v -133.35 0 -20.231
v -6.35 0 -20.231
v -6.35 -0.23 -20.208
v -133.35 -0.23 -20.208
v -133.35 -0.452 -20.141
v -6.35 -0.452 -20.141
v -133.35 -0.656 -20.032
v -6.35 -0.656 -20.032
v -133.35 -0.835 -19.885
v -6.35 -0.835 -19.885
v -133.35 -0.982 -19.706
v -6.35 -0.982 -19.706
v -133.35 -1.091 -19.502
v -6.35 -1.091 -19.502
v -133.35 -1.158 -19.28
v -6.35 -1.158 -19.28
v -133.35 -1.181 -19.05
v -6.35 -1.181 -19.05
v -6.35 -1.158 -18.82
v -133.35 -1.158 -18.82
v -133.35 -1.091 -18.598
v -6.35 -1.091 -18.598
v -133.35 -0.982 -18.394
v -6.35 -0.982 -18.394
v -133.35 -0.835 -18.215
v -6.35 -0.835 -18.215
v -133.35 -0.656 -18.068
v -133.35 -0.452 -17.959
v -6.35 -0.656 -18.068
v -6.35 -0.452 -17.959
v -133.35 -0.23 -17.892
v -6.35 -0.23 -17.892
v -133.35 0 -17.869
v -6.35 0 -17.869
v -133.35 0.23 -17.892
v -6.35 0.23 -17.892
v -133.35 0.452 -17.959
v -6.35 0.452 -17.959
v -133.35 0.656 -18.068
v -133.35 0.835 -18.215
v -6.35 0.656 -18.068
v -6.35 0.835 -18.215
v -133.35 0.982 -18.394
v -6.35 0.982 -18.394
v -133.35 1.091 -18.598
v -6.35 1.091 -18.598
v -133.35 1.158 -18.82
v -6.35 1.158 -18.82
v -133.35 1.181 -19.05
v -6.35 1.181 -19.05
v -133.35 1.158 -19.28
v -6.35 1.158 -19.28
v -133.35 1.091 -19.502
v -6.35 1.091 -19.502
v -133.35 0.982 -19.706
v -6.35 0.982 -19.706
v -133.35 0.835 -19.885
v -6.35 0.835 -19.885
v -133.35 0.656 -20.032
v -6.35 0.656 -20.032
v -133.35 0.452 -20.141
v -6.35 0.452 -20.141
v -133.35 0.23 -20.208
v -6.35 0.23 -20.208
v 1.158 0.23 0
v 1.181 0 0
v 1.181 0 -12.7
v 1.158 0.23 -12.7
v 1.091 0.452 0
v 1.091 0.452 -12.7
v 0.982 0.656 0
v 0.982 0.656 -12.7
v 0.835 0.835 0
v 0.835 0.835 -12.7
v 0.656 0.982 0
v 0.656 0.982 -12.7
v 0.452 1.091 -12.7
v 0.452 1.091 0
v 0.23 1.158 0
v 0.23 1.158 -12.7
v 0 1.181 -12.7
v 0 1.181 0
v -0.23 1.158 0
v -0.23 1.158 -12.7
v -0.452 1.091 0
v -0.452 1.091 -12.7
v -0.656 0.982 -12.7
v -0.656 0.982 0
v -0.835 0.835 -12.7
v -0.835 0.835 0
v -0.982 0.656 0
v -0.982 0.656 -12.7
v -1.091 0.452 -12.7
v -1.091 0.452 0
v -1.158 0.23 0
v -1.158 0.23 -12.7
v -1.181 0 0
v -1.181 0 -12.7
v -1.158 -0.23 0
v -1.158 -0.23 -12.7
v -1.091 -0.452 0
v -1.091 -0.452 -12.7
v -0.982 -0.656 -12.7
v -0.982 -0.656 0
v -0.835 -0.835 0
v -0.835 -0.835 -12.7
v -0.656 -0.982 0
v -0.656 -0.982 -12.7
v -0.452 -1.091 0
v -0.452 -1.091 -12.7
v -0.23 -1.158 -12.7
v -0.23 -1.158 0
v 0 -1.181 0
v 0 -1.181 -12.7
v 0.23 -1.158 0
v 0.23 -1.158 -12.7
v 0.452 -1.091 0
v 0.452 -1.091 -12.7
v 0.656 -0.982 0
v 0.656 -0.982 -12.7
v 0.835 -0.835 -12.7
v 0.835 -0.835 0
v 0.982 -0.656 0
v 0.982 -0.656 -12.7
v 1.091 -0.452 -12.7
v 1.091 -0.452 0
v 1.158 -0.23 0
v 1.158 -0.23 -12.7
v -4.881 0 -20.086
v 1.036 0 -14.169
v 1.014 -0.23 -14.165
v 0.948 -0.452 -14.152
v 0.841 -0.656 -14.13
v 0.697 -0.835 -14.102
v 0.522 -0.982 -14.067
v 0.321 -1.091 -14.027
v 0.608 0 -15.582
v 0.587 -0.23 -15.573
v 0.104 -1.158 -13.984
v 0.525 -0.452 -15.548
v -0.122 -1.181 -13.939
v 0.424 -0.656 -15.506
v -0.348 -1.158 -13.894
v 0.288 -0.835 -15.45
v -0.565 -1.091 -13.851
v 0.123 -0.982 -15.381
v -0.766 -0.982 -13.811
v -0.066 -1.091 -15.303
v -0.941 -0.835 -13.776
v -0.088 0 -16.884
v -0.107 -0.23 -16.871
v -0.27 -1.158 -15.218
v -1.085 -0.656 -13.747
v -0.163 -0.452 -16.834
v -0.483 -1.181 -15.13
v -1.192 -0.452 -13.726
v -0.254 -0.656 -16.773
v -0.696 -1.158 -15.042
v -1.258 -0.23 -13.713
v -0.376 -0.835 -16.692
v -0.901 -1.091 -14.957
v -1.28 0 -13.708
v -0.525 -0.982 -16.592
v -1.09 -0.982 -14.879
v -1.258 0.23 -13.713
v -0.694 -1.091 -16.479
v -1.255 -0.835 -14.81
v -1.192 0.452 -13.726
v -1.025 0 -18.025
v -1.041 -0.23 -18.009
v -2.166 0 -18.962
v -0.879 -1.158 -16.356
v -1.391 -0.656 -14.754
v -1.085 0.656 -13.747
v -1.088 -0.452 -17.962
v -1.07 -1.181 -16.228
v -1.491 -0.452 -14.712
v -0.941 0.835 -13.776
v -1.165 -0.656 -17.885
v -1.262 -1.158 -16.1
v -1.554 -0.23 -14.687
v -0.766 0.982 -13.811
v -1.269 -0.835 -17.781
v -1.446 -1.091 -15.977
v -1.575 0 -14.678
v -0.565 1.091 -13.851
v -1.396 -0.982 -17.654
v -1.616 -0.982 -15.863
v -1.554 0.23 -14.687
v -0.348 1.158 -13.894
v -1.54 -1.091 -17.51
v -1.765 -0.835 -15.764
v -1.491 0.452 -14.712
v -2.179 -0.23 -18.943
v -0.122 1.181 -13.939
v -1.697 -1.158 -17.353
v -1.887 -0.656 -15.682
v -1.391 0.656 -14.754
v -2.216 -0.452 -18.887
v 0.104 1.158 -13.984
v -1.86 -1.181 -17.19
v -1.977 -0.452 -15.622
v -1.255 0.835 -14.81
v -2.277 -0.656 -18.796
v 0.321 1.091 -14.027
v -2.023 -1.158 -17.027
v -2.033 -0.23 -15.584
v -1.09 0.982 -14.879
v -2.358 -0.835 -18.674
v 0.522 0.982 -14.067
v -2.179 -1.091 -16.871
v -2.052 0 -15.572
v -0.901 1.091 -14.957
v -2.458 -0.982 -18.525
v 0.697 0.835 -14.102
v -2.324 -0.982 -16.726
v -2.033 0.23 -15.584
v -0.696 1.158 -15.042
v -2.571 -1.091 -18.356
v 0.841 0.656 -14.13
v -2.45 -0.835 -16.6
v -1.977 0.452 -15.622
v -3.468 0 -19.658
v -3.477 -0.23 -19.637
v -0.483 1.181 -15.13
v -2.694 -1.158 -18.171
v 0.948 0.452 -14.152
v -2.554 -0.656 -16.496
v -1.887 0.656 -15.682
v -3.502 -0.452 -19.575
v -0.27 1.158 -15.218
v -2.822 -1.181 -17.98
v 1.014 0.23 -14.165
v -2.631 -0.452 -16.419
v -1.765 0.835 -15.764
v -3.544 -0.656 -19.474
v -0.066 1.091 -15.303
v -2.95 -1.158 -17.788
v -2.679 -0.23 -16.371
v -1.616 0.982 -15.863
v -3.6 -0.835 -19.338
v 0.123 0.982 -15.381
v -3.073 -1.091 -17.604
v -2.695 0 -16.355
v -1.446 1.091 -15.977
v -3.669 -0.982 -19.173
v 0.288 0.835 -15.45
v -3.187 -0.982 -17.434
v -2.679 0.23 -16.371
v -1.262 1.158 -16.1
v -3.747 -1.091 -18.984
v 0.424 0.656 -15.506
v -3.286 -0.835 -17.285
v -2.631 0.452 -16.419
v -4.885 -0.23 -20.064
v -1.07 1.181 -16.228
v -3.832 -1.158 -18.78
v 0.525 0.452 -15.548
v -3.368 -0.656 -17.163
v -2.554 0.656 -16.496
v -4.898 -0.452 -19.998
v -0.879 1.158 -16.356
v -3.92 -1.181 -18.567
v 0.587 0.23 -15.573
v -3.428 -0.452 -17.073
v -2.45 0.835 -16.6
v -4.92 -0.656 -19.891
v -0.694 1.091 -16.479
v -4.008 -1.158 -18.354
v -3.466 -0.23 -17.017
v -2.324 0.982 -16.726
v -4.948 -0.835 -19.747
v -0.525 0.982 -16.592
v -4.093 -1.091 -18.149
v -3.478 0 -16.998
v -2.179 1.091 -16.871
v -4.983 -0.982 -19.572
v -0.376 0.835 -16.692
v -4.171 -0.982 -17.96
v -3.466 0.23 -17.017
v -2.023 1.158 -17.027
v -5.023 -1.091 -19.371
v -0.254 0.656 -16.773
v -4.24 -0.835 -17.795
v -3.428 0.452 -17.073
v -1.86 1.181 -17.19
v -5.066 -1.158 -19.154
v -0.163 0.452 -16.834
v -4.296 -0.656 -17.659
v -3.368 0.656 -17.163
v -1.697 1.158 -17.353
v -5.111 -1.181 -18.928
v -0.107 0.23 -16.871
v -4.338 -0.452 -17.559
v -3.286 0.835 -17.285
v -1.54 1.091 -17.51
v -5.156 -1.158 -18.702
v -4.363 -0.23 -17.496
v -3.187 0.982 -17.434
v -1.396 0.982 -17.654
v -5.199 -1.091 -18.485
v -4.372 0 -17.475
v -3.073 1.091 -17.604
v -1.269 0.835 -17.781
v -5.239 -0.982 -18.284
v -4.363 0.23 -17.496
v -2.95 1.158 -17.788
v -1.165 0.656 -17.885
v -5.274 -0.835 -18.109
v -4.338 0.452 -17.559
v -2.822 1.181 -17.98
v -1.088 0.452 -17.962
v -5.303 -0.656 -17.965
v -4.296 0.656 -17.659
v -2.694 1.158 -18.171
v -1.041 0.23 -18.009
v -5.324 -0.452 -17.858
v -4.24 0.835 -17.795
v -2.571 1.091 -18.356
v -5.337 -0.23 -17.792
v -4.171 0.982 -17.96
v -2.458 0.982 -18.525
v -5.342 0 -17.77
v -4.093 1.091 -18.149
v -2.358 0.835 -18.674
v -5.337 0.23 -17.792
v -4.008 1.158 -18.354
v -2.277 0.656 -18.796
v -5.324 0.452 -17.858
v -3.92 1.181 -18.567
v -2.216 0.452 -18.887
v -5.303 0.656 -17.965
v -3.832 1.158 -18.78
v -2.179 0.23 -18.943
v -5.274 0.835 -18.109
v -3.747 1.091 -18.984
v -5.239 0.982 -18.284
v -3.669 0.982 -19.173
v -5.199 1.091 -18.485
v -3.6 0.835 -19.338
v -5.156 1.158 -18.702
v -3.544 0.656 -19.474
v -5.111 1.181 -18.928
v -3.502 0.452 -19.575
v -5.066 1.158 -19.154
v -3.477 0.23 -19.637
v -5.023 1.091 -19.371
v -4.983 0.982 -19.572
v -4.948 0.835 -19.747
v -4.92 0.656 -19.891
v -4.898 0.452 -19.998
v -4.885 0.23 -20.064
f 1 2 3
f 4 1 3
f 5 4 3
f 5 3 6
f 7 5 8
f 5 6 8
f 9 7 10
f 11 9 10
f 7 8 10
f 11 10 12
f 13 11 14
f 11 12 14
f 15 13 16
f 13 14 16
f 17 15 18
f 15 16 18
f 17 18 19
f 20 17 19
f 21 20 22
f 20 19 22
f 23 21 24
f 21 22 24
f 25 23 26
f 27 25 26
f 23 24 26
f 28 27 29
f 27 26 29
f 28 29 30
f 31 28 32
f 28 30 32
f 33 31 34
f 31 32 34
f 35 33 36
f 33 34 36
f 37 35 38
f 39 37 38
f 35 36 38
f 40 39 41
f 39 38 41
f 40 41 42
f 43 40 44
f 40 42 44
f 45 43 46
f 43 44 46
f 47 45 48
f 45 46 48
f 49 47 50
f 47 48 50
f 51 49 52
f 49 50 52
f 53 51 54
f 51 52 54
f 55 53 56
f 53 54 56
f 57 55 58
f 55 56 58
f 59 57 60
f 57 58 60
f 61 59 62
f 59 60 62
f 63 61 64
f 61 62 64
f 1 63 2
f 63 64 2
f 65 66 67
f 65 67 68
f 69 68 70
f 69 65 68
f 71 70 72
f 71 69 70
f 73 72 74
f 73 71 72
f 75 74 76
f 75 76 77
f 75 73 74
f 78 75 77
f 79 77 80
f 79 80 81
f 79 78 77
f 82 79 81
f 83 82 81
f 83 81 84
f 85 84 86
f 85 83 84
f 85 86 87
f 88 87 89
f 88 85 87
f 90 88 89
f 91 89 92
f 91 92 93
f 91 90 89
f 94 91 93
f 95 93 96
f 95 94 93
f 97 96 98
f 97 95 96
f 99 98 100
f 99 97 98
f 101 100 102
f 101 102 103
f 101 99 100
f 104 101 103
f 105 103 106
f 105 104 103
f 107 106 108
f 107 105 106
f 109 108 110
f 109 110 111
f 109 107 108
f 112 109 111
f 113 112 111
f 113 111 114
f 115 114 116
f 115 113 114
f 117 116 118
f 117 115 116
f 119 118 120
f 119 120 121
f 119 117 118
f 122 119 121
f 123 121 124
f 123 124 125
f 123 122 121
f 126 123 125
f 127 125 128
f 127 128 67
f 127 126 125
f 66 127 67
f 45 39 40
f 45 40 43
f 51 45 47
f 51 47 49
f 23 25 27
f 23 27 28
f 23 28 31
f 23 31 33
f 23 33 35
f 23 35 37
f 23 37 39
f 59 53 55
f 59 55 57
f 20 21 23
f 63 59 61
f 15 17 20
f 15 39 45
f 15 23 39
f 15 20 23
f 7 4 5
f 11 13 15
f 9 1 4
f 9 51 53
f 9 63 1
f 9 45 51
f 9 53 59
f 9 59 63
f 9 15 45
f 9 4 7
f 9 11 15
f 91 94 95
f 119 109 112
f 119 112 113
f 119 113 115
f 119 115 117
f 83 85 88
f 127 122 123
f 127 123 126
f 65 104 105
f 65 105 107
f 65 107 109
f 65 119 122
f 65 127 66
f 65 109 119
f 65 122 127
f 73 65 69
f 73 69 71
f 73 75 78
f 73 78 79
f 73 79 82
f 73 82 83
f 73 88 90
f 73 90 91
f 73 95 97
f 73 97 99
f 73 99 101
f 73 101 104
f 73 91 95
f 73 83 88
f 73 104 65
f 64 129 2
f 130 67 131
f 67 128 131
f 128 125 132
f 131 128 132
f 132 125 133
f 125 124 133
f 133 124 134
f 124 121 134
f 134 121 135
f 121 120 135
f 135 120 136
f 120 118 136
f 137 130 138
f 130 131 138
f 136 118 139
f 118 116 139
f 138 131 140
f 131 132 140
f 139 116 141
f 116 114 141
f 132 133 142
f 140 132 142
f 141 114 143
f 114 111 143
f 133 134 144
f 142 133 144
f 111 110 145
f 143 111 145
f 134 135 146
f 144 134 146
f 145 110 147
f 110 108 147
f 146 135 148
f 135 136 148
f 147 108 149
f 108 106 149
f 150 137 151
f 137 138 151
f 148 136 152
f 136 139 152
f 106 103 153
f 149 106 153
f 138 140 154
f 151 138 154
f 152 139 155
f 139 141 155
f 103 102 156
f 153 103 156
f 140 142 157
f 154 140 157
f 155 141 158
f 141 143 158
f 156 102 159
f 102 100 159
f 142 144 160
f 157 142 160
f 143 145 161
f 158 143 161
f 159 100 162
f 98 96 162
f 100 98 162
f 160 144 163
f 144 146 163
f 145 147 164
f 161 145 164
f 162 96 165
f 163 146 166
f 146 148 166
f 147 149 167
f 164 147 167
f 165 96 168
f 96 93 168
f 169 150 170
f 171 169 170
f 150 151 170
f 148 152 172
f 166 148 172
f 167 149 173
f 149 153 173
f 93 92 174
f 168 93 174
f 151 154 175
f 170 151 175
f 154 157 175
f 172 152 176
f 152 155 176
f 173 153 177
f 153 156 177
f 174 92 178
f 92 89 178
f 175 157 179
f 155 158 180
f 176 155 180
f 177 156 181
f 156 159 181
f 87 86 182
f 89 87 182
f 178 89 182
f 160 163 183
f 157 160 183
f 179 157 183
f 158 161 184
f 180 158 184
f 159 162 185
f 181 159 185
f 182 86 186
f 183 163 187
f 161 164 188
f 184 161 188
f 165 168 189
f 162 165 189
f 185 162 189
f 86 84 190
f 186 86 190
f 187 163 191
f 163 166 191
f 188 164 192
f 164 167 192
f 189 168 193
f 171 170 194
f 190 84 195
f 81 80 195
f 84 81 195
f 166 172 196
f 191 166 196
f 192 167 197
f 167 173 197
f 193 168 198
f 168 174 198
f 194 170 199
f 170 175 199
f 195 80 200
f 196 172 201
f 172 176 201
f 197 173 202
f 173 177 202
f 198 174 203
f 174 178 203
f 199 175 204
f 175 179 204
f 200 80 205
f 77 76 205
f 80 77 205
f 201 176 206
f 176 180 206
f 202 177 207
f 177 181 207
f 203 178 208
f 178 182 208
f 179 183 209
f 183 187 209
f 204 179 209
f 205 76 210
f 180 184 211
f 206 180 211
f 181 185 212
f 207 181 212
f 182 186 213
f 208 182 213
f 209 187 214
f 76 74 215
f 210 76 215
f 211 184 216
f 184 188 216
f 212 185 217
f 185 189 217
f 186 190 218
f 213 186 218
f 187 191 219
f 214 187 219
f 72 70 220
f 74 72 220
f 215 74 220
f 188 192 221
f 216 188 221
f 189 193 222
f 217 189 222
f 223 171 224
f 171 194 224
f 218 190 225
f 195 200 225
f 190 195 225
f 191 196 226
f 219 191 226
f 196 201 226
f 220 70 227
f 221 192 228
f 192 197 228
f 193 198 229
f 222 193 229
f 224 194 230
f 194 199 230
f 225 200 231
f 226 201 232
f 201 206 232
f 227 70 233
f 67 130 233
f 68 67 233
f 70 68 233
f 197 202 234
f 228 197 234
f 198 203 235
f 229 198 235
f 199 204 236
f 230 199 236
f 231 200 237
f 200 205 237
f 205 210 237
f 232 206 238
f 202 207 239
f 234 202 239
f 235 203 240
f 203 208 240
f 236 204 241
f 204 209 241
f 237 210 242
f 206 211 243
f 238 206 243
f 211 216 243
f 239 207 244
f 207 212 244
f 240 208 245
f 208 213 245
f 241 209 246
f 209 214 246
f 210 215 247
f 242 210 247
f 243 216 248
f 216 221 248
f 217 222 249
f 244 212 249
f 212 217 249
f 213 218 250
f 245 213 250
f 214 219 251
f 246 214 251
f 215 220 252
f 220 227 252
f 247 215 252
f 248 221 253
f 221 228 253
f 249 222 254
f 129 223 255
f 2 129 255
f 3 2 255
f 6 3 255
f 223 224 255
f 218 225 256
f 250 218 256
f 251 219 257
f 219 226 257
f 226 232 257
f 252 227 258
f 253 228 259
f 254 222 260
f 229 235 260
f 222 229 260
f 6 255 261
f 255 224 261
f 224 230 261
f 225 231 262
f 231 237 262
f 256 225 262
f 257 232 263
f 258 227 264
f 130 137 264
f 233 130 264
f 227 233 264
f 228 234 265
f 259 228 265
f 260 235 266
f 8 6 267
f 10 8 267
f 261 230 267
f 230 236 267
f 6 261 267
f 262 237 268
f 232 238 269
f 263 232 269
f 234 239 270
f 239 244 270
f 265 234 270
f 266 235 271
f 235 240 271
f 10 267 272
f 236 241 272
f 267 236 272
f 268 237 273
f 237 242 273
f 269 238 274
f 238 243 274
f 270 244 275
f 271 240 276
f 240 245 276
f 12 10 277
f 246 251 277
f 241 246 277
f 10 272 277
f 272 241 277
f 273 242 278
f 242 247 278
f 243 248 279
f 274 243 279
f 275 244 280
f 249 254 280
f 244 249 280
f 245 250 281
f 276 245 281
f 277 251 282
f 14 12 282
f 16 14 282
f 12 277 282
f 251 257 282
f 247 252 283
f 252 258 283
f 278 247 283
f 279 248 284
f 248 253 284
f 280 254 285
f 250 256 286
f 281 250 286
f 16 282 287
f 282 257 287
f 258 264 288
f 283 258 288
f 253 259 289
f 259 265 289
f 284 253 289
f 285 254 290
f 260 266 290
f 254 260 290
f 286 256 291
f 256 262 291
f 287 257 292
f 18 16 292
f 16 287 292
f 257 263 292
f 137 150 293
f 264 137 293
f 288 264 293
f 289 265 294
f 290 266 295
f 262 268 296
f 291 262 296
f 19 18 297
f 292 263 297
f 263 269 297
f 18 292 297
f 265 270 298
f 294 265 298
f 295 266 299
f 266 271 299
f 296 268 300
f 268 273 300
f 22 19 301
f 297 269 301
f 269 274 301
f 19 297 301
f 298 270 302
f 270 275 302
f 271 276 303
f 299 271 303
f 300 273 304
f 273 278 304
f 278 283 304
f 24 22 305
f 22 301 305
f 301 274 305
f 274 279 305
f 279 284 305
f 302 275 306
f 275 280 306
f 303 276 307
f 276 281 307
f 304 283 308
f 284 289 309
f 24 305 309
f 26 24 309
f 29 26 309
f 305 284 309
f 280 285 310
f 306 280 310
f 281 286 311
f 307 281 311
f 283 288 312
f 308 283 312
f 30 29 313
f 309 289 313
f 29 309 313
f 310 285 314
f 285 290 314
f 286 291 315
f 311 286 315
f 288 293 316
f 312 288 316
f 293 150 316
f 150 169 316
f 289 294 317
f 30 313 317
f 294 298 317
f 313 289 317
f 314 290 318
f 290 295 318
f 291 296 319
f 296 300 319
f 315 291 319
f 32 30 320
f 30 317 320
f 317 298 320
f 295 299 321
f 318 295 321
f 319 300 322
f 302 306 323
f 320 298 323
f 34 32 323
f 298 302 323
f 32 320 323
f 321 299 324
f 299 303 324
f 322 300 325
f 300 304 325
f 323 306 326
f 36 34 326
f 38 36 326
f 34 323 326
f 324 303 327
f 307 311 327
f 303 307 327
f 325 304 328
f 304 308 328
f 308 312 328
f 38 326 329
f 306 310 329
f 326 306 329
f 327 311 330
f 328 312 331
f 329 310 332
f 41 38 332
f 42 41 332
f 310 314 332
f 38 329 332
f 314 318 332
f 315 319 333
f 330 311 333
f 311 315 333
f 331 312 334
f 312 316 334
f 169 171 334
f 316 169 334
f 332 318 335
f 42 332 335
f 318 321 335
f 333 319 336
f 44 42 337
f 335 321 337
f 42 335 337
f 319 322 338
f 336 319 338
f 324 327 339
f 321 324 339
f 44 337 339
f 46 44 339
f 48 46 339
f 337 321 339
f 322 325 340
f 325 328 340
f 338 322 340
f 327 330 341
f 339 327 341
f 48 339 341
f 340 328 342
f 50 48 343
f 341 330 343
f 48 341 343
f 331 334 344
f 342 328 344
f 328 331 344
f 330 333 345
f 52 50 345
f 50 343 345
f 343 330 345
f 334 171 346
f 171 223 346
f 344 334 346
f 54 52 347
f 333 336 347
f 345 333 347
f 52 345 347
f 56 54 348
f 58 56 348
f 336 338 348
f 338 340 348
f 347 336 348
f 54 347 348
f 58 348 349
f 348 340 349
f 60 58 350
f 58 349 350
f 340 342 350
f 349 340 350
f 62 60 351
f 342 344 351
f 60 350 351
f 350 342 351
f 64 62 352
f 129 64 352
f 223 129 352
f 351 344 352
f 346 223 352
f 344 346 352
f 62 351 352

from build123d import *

# Parameters (mm, degrees)
SKETCH1_R           = 1.1811
RODEND_DEPTH        = 12.7
SKETCH4_R           = 1.1811
REVOLVE1_ANGLE      = 90
SKETCH5_R           = 1.1811
BOSS_EXTRUDE1_DEPTH = 127


with BuildPart() as part:
    # Sketch1 → RodEnd (new body)
    with BuildSketch(Plane.XY):
        Circle(SKETCH1_R)
    extrude(amount=-RODEND_DEPTH)

    # Sketch4 → Revolve1 (revolve)
    with BuildSketch(Plane(origin=(0, 0, -12.7), x_dir=(-1, 0, 0), z_dir=(0, 0, -1))):
        with Locations(Location((0, 0, 0), (0, 0, 180))):
            Circle(SKETCH4_R)
    revolve(axis=Axis((-6.35, 0, -12.7), (0, 1, 0)), revolution_arc=REVOLVE1_ANGLE)

    # Sketch5 → Boss-Extrude1 (add)
    with BuildSketch(Plane.ZY.offset(6.35)):
        with Locations(Location((-19.05, 0, 0), (0, 0, 180))):
            Circle(SKETCH5_R)
    extrude(amount=BOSS_EXTRUDE1_DEPTH)


solid = part.part
